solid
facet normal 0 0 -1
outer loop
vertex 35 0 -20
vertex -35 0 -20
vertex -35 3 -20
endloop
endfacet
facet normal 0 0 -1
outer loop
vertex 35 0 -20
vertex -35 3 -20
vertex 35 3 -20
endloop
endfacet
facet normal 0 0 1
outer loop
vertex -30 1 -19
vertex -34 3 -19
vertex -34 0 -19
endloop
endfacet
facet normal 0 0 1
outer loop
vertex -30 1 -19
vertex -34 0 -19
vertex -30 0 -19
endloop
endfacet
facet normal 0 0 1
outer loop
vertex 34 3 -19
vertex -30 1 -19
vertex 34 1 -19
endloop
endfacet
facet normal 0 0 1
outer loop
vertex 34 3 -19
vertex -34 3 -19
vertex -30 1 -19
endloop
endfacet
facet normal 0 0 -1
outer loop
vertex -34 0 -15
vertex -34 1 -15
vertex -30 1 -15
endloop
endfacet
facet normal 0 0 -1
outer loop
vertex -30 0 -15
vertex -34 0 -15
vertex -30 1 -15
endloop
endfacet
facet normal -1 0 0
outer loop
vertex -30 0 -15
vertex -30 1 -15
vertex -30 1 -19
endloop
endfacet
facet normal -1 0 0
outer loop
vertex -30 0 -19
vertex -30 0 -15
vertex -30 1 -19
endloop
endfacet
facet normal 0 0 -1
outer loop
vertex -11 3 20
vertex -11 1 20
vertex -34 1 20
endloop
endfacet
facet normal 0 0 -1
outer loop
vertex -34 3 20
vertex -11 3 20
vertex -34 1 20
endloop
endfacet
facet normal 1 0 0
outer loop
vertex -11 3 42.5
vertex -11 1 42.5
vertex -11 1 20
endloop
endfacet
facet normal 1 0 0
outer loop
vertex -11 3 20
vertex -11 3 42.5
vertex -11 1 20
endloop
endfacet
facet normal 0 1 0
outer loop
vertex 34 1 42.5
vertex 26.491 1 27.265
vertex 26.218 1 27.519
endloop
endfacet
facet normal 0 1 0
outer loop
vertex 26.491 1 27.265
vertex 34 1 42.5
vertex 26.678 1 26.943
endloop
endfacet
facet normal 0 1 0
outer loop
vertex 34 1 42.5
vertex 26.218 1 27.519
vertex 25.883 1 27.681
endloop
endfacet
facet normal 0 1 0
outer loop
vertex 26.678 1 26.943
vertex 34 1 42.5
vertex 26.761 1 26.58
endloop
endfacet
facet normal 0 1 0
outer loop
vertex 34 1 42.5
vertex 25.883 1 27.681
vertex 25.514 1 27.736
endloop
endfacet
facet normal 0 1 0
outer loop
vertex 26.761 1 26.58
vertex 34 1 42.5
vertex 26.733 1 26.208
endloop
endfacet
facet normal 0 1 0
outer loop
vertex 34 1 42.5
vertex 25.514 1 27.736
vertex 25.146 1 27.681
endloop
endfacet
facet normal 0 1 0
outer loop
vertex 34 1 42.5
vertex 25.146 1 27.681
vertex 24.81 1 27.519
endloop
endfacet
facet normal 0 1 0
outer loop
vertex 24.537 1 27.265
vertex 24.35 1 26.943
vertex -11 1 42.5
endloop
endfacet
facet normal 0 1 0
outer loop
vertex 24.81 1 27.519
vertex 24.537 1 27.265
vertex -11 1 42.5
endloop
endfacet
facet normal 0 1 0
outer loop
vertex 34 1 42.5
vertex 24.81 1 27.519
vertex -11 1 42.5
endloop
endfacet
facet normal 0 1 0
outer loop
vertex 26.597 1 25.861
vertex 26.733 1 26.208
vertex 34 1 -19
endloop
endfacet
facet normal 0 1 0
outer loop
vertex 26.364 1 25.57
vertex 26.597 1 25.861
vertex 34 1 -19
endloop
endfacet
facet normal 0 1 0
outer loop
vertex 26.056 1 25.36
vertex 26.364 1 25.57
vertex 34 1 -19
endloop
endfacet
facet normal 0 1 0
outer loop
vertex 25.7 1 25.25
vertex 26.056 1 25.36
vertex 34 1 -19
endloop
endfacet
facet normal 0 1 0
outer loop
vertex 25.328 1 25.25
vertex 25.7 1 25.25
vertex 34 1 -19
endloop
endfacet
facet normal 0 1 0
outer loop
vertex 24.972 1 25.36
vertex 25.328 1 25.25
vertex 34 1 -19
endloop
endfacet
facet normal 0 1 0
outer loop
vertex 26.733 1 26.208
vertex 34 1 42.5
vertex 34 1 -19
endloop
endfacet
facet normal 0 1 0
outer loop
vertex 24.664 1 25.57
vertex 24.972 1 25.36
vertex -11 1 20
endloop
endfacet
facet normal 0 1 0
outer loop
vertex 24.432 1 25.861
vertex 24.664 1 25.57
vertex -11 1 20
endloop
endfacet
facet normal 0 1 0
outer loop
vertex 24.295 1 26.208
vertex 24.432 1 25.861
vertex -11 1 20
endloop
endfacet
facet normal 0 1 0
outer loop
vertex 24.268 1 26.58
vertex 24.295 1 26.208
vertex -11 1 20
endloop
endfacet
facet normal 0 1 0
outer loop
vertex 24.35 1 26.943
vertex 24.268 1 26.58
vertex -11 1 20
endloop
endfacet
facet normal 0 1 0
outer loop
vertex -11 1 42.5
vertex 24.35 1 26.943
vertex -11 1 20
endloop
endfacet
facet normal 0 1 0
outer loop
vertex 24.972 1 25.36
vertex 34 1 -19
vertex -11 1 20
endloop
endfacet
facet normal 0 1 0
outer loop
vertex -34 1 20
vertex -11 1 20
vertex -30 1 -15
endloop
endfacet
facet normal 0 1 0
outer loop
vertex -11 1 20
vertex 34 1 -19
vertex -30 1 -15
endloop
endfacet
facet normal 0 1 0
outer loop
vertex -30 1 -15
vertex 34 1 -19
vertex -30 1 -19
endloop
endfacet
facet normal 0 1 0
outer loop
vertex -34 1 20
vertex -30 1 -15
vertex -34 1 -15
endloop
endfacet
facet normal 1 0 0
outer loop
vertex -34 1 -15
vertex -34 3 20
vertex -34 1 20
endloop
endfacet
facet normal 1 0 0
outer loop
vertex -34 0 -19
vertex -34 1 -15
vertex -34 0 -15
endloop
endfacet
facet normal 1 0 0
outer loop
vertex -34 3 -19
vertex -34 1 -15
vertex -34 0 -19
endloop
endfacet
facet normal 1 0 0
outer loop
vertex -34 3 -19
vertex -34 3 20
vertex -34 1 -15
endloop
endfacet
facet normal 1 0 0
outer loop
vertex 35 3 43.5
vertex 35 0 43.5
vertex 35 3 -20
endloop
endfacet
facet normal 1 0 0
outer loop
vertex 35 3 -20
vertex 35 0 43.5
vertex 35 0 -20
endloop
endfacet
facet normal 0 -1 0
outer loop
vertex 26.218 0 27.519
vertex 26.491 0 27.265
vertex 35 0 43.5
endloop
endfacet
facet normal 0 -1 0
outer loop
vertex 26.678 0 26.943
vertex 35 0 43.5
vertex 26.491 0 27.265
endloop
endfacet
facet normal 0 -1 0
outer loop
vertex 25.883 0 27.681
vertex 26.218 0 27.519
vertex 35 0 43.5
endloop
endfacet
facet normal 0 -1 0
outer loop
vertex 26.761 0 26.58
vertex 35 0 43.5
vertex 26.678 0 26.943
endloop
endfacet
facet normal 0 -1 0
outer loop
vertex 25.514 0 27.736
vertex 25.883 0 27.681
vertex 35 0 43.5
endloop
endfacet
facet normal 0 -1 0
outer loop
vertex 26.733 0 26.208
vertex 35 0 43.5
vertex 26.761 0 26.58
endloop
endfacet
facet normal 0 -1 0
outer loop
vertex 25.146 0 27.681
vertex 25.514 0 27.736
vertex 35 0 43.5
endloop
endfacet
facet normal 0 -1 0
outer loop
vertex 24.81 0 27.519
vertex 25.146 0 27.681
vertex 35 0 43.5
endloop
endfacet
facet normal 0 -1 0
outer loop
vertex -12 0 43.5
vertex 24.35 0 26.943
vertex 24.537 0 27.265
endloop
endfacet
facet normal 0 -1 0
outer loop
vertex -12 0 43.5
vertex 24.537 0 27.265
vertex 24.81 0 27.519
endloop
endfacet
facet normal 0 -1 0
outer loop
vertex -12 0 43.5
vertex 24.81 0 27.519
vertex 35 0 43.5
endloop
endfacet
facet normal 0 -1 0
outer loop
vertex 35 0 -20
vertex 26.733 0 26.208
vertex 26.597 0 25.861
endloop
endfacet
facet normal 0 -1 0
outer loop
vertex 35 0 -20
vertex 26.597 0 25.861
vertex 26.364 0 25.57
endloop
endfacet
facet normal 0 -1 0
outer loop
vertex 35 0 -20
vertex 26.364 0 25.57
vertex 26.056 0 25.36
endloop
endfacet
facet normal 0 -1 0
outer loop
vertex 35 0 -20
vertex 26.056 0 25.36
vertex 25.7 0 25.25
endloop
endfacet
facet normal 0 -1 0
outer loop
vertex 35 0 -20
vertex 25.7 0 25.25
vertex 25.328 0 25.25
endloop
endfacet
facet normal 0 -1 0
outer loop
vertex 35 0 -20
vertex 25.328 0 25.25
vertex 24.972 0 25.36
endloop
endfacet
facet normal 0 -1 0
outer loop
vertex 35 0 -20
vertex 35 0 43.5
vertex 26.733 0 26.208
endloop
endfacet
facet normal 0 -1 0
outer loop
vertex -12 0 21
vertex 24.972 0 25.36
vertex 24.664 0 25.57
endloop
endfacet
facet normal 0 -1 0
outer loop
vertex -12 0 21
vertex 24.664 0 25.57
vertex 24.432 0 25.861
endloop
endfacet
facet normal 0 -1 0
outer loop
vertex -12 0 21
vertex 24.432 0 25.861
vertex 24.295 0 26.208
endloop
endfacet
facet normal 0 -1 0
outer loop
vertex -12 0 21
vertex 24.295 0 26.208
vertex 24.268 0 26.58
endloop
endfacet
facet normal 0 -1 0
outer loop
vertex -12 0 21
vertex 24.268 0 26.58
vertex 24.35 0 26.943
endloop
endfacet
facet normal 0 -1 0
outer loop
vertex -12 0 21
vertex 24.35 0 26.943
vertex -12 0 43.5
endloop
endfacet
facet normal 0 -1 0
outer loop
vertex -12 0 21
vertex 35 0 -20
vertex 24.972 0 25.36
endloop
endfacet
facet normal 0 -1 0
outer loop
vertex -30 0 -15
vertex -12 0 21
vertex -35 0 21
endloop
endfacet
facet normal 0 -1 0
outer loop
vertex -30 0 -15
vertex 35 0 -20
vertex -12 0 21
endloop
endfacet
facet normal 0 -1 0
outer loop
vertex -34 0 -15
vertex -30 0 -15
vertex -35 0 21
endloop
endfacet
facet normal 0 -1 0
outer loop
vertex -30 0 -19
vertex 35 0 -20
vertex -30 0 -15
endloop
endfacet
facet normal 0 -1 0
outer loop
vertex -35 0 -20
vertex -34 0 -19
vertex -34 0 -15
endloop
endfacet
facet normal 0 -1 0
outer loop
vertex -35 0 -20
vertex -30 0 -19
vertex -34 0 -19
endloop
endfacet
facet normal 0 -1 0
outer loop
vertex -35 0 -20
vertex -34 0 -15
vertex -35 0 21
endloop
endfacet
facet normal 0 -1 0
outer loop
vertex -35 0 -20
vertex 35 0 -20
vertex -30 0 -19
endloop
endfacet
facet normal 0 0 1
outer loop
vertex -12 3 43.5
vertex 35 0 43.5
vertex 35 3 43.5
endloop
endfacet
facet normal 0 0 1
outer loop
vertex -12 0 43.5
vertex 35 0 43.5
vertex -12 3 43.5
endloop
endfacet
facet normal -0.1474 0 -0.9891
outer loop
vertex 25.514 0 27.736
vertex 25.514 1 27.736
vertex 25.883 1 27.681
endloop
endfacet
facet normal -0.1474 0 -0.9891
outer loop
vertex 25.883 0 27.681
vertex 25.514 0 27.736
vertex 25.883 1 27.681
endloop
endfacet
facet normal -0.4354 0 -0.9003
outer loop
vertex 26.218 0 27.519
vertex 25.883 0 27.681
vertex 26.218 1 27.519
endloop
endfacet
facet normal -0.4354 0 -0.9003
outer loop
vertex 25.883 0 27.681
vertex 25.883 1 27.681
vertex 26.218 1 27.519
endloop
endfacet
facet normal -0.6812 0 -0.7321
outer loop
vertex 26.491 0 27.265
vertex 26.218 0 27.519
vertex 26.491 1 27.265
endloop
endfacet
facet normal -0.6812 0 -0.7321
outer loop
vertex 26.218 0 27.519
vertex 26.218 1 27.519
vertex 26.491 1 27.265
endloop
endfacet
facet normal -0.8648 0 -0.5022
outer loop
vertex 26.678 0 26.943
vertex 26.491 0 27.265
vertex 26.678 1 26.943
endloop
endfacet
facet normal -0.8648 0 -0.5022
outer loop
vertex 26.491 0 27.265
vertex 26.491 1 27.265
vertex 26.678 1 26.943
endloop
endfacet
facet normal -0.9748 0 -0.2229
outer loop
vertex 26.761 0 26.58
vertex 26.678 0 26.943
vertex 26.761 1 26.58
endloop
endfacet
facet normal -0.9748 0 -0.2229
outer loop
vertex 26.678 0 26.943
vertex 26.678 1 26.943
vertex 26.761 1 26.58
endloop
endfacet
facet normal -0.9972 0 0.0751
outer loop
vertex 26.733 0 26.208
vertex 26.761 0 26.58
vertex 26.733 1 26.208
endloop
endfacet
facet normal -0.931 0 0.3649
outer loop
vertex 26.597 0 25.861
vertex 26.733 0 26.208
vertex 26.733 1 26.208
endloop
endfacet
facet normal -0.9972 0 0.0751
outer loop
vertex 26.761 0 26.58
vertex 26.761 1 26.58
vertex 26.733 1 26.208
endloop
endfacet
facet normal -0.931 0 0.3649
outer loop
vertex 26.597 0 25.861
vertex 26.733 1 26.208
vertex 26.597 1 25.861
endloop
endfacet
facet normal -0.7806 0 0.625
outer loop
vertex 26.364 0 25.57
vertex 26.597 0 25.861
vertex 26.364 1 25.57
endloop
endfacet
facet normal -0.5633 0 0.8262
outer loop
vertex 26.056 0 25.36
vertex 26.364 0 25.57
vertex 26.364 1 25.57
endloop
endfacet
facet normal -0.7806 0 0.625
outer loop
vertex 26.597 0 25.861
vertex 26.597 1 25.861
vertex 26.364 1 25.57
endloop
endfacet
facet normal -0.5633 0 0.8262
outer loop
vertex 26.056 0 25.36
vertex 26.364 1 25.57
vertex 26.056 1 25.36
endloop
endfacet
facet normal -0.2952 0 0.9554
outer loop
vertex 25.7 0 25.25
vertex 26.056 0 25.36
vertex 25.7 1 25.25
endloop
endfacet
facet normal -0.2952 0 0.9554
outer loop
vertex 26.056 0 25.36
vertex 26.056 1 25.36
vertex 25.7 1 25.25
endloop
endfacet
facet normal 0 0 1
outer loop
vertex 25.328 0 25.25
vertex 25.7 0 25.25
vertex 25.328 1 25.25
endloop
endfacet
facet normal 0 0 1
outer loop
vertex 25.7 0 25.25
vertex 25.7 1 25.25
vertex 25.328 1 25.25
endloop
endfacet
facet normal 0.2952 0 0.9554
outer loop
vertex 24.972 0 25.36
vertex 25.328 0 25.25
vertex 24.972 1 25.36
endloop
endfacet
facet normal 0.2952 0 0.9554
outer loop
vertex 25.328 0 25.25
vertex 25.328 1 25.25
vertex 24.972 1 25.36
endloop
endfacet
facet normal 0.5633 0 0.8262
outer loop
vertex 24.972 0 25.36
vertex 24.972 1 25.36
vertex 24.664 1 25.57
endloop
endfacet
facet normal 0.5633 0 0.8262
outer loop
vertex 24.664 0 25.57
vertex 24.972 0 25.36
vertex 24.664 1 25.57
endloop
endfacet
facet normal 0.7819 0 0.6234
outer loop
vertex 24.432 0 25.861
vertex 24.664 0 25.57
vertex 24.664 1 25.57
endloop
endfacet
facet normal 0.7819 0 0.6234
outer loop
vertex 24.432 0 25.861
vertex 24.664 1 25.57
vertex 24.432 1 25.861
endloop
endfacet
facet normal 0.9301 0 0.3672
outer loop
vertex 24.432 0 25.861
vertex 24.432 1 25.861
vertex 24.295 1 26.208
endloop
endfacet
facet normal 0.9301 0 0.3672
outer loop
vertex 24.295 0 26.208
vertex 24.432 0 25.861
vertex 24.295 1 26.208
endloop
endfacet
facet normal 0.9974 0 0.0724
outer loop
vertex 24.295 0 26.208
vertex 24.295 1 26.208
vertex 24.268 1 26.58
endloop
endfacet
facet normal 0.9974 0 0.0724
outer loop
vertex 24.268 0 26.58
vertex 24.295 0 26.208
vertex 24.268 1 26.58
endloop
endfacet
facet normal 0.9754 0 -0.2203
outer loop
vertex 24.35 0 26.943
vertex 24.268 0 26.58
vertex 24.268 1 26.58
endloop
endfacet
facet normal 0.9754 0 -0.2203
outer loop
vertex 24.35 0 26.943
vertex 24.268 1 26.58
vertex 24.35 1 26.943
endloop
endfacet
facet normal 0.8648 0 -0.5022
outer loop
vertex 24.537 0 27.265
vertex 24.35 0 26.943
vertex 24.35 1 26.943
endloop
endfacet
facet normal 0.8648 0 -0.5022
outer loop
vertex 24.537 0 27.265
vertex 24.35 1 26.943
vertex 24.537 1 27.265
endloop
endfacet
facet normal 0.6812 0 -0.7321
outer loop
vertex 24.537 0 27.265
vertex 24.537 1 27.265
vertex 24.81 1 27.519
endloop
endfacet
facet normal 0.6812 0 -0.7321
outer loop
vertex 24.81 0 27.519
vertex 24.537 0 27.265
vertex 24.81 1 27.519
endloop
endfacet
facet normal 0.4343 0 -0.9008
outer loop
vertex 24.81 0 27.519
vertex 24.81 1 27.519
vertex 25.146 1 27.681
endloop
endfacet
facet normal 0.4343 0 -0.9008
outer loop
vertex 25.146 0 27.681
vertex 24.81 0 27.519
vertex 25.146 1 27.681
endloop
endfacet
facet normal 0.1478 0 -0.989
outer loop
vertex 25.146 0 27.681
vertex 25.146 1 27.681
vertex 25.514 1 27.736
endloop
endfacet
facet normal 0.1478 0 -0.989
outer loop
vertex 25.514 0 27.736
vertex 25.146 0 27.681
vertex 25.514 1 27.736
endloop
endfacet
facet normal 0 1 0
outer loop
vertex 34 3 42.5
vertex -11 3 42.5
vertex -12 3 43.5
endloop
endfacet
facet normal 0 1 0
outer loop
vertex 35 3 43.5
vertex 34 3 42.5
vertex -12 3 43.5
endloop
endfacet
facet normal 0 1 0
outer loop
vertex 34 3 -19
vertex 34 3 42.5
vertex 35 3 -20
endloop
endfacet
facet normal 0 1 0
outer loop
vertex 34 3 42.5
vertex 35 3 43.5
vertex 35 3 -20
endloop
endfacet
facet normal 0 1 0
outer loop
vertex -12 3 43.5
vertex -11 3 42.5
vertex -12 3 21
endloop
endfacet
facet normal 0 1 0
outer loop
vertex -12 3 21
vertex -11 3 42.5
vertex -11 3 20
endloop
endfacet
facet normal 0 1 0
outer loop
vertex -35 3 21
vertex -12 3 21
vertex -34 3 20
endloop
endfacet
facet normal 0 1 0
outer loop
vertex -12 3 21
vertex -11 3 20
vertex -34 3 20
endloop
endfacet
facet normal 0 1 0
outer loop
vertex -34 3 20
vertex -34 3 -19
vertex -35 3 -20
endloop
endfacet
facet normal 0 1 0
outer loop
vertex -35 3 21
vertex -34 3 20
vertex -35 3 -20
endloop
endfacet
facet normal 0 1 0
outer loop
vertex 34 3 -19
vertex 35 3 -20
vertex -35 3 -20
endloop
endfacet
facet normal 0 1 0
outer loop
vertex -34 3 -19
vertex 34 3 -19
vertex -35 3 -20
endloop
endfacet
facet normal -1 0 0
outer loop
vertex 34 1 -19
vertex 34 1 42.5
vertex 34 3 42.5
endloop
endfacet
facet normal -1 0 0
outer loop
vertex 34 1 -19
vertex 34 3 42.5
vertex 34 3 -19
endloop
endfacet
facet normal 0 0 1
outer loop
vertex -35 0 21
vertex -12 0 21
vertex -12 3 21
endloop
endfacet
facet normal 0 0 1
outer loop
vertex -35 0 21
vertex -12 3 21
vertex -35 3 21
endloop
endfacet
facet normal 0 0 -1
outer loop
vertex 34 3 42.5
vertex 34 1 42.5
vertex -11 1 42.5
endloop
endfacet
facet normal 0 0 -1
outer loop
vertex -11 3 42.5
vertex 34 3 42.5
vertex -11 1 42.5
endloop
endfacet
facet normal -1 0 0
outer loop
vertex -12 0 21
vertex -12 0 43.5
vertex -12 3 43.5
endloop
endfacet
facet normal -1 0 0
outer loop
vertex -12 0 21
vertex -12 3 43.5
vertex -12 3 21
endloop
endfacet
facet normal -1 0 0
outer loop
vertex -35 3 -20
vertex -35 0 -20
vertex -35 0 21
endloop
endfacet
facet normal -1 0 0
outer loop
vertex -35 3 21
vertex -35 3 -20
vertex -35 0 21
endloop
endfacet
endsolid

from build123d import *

# Parameters (mm, degrees)
BOSS_EXTRUDE1_DEPTH = 3
CUT_EXTRUDE2_START  = 1
CUT_EXTRUDE2_DEPTH  = 55.91287866
SKETCH2_R           = 1.25
CUT_EXTRUDE3_DEPTH  = 56.868148349
CUT_EXTRUDE4_REACH  = 57.868
SKETCH3_W           = 4
SKETCH3_H           = 4


with BuildPart() as part:
    # Sketch1 → Boss-Extrude1 (new body)
    with BuildSketch(Plane(origin=(0, 0, 0), x_dir=(1, 0, 0), z_dir=(0, 1, 0))):
        Polygon((35, 20), (-35, 20), (-35, -21), (-12, -21), (-12, -43.5), (35, -43.5), align=None)
    extrude(amount=BOSS_EXTRUDE1_DEPTH)

    # Sketch1<6> → Cut-Extrude2 (cut, through all)
    with BuildSketch(Plane(origin=(0, 0, 0), x_dir=(1, 0, 0), z_dir=(0, 1, 0)).offset(CUT_EXTRUDE2_START)):
        Polygon((-34, 19), (-34, -18), (-34, -20), (-11, -20), (-11, -42.5), (34, -42.5), (34, -20), (34, -18), (34, 19), align=None)
    extrude(amount=CUT_EXTRUDE2_DEPTH, mode=Mode.SUBTRACT)

    # Sketch2 → Cut-Extrude3 (cut, through all)
    with BuildSketch(Plane(origin=(0, 1, 0), x_dir=(1, 0, 0), z_dir=(0, 1, 0))):
        with Locations((25.514070345, -26.486113073)):
            Circle(SKETCH2_R)
    extrude(amount=-CUT_EXTRUDE3_DEPTH, mode=Mode.SUBTRACT)

    # Sketch3 → Cut-Extrude4 (cut, up to next)
    with BuildSketch(Plane(origin=(0, 1, 0), x_dir=(1, 0, 0), z_dir=(0, 1, 0)), mode=Mode.PRIVATE) as cut_extrude4_sk1:
        with Locations((-32, 17)):
            Rectangle(SKETCH3_W, SKETCH3_H)
    cut_extrude4_tool1 = extrude(cut_extrude4_sk1.sketch, amount=-CUT_EXTRUDE4_REACH, mode=Mode.PRIVATE) & part.part
    add(cut_extrude4_tool1.solids().sort_by_distance((-32, 1, -17))[0], mode=Mode.SUBTRACT)


solid = part.part
